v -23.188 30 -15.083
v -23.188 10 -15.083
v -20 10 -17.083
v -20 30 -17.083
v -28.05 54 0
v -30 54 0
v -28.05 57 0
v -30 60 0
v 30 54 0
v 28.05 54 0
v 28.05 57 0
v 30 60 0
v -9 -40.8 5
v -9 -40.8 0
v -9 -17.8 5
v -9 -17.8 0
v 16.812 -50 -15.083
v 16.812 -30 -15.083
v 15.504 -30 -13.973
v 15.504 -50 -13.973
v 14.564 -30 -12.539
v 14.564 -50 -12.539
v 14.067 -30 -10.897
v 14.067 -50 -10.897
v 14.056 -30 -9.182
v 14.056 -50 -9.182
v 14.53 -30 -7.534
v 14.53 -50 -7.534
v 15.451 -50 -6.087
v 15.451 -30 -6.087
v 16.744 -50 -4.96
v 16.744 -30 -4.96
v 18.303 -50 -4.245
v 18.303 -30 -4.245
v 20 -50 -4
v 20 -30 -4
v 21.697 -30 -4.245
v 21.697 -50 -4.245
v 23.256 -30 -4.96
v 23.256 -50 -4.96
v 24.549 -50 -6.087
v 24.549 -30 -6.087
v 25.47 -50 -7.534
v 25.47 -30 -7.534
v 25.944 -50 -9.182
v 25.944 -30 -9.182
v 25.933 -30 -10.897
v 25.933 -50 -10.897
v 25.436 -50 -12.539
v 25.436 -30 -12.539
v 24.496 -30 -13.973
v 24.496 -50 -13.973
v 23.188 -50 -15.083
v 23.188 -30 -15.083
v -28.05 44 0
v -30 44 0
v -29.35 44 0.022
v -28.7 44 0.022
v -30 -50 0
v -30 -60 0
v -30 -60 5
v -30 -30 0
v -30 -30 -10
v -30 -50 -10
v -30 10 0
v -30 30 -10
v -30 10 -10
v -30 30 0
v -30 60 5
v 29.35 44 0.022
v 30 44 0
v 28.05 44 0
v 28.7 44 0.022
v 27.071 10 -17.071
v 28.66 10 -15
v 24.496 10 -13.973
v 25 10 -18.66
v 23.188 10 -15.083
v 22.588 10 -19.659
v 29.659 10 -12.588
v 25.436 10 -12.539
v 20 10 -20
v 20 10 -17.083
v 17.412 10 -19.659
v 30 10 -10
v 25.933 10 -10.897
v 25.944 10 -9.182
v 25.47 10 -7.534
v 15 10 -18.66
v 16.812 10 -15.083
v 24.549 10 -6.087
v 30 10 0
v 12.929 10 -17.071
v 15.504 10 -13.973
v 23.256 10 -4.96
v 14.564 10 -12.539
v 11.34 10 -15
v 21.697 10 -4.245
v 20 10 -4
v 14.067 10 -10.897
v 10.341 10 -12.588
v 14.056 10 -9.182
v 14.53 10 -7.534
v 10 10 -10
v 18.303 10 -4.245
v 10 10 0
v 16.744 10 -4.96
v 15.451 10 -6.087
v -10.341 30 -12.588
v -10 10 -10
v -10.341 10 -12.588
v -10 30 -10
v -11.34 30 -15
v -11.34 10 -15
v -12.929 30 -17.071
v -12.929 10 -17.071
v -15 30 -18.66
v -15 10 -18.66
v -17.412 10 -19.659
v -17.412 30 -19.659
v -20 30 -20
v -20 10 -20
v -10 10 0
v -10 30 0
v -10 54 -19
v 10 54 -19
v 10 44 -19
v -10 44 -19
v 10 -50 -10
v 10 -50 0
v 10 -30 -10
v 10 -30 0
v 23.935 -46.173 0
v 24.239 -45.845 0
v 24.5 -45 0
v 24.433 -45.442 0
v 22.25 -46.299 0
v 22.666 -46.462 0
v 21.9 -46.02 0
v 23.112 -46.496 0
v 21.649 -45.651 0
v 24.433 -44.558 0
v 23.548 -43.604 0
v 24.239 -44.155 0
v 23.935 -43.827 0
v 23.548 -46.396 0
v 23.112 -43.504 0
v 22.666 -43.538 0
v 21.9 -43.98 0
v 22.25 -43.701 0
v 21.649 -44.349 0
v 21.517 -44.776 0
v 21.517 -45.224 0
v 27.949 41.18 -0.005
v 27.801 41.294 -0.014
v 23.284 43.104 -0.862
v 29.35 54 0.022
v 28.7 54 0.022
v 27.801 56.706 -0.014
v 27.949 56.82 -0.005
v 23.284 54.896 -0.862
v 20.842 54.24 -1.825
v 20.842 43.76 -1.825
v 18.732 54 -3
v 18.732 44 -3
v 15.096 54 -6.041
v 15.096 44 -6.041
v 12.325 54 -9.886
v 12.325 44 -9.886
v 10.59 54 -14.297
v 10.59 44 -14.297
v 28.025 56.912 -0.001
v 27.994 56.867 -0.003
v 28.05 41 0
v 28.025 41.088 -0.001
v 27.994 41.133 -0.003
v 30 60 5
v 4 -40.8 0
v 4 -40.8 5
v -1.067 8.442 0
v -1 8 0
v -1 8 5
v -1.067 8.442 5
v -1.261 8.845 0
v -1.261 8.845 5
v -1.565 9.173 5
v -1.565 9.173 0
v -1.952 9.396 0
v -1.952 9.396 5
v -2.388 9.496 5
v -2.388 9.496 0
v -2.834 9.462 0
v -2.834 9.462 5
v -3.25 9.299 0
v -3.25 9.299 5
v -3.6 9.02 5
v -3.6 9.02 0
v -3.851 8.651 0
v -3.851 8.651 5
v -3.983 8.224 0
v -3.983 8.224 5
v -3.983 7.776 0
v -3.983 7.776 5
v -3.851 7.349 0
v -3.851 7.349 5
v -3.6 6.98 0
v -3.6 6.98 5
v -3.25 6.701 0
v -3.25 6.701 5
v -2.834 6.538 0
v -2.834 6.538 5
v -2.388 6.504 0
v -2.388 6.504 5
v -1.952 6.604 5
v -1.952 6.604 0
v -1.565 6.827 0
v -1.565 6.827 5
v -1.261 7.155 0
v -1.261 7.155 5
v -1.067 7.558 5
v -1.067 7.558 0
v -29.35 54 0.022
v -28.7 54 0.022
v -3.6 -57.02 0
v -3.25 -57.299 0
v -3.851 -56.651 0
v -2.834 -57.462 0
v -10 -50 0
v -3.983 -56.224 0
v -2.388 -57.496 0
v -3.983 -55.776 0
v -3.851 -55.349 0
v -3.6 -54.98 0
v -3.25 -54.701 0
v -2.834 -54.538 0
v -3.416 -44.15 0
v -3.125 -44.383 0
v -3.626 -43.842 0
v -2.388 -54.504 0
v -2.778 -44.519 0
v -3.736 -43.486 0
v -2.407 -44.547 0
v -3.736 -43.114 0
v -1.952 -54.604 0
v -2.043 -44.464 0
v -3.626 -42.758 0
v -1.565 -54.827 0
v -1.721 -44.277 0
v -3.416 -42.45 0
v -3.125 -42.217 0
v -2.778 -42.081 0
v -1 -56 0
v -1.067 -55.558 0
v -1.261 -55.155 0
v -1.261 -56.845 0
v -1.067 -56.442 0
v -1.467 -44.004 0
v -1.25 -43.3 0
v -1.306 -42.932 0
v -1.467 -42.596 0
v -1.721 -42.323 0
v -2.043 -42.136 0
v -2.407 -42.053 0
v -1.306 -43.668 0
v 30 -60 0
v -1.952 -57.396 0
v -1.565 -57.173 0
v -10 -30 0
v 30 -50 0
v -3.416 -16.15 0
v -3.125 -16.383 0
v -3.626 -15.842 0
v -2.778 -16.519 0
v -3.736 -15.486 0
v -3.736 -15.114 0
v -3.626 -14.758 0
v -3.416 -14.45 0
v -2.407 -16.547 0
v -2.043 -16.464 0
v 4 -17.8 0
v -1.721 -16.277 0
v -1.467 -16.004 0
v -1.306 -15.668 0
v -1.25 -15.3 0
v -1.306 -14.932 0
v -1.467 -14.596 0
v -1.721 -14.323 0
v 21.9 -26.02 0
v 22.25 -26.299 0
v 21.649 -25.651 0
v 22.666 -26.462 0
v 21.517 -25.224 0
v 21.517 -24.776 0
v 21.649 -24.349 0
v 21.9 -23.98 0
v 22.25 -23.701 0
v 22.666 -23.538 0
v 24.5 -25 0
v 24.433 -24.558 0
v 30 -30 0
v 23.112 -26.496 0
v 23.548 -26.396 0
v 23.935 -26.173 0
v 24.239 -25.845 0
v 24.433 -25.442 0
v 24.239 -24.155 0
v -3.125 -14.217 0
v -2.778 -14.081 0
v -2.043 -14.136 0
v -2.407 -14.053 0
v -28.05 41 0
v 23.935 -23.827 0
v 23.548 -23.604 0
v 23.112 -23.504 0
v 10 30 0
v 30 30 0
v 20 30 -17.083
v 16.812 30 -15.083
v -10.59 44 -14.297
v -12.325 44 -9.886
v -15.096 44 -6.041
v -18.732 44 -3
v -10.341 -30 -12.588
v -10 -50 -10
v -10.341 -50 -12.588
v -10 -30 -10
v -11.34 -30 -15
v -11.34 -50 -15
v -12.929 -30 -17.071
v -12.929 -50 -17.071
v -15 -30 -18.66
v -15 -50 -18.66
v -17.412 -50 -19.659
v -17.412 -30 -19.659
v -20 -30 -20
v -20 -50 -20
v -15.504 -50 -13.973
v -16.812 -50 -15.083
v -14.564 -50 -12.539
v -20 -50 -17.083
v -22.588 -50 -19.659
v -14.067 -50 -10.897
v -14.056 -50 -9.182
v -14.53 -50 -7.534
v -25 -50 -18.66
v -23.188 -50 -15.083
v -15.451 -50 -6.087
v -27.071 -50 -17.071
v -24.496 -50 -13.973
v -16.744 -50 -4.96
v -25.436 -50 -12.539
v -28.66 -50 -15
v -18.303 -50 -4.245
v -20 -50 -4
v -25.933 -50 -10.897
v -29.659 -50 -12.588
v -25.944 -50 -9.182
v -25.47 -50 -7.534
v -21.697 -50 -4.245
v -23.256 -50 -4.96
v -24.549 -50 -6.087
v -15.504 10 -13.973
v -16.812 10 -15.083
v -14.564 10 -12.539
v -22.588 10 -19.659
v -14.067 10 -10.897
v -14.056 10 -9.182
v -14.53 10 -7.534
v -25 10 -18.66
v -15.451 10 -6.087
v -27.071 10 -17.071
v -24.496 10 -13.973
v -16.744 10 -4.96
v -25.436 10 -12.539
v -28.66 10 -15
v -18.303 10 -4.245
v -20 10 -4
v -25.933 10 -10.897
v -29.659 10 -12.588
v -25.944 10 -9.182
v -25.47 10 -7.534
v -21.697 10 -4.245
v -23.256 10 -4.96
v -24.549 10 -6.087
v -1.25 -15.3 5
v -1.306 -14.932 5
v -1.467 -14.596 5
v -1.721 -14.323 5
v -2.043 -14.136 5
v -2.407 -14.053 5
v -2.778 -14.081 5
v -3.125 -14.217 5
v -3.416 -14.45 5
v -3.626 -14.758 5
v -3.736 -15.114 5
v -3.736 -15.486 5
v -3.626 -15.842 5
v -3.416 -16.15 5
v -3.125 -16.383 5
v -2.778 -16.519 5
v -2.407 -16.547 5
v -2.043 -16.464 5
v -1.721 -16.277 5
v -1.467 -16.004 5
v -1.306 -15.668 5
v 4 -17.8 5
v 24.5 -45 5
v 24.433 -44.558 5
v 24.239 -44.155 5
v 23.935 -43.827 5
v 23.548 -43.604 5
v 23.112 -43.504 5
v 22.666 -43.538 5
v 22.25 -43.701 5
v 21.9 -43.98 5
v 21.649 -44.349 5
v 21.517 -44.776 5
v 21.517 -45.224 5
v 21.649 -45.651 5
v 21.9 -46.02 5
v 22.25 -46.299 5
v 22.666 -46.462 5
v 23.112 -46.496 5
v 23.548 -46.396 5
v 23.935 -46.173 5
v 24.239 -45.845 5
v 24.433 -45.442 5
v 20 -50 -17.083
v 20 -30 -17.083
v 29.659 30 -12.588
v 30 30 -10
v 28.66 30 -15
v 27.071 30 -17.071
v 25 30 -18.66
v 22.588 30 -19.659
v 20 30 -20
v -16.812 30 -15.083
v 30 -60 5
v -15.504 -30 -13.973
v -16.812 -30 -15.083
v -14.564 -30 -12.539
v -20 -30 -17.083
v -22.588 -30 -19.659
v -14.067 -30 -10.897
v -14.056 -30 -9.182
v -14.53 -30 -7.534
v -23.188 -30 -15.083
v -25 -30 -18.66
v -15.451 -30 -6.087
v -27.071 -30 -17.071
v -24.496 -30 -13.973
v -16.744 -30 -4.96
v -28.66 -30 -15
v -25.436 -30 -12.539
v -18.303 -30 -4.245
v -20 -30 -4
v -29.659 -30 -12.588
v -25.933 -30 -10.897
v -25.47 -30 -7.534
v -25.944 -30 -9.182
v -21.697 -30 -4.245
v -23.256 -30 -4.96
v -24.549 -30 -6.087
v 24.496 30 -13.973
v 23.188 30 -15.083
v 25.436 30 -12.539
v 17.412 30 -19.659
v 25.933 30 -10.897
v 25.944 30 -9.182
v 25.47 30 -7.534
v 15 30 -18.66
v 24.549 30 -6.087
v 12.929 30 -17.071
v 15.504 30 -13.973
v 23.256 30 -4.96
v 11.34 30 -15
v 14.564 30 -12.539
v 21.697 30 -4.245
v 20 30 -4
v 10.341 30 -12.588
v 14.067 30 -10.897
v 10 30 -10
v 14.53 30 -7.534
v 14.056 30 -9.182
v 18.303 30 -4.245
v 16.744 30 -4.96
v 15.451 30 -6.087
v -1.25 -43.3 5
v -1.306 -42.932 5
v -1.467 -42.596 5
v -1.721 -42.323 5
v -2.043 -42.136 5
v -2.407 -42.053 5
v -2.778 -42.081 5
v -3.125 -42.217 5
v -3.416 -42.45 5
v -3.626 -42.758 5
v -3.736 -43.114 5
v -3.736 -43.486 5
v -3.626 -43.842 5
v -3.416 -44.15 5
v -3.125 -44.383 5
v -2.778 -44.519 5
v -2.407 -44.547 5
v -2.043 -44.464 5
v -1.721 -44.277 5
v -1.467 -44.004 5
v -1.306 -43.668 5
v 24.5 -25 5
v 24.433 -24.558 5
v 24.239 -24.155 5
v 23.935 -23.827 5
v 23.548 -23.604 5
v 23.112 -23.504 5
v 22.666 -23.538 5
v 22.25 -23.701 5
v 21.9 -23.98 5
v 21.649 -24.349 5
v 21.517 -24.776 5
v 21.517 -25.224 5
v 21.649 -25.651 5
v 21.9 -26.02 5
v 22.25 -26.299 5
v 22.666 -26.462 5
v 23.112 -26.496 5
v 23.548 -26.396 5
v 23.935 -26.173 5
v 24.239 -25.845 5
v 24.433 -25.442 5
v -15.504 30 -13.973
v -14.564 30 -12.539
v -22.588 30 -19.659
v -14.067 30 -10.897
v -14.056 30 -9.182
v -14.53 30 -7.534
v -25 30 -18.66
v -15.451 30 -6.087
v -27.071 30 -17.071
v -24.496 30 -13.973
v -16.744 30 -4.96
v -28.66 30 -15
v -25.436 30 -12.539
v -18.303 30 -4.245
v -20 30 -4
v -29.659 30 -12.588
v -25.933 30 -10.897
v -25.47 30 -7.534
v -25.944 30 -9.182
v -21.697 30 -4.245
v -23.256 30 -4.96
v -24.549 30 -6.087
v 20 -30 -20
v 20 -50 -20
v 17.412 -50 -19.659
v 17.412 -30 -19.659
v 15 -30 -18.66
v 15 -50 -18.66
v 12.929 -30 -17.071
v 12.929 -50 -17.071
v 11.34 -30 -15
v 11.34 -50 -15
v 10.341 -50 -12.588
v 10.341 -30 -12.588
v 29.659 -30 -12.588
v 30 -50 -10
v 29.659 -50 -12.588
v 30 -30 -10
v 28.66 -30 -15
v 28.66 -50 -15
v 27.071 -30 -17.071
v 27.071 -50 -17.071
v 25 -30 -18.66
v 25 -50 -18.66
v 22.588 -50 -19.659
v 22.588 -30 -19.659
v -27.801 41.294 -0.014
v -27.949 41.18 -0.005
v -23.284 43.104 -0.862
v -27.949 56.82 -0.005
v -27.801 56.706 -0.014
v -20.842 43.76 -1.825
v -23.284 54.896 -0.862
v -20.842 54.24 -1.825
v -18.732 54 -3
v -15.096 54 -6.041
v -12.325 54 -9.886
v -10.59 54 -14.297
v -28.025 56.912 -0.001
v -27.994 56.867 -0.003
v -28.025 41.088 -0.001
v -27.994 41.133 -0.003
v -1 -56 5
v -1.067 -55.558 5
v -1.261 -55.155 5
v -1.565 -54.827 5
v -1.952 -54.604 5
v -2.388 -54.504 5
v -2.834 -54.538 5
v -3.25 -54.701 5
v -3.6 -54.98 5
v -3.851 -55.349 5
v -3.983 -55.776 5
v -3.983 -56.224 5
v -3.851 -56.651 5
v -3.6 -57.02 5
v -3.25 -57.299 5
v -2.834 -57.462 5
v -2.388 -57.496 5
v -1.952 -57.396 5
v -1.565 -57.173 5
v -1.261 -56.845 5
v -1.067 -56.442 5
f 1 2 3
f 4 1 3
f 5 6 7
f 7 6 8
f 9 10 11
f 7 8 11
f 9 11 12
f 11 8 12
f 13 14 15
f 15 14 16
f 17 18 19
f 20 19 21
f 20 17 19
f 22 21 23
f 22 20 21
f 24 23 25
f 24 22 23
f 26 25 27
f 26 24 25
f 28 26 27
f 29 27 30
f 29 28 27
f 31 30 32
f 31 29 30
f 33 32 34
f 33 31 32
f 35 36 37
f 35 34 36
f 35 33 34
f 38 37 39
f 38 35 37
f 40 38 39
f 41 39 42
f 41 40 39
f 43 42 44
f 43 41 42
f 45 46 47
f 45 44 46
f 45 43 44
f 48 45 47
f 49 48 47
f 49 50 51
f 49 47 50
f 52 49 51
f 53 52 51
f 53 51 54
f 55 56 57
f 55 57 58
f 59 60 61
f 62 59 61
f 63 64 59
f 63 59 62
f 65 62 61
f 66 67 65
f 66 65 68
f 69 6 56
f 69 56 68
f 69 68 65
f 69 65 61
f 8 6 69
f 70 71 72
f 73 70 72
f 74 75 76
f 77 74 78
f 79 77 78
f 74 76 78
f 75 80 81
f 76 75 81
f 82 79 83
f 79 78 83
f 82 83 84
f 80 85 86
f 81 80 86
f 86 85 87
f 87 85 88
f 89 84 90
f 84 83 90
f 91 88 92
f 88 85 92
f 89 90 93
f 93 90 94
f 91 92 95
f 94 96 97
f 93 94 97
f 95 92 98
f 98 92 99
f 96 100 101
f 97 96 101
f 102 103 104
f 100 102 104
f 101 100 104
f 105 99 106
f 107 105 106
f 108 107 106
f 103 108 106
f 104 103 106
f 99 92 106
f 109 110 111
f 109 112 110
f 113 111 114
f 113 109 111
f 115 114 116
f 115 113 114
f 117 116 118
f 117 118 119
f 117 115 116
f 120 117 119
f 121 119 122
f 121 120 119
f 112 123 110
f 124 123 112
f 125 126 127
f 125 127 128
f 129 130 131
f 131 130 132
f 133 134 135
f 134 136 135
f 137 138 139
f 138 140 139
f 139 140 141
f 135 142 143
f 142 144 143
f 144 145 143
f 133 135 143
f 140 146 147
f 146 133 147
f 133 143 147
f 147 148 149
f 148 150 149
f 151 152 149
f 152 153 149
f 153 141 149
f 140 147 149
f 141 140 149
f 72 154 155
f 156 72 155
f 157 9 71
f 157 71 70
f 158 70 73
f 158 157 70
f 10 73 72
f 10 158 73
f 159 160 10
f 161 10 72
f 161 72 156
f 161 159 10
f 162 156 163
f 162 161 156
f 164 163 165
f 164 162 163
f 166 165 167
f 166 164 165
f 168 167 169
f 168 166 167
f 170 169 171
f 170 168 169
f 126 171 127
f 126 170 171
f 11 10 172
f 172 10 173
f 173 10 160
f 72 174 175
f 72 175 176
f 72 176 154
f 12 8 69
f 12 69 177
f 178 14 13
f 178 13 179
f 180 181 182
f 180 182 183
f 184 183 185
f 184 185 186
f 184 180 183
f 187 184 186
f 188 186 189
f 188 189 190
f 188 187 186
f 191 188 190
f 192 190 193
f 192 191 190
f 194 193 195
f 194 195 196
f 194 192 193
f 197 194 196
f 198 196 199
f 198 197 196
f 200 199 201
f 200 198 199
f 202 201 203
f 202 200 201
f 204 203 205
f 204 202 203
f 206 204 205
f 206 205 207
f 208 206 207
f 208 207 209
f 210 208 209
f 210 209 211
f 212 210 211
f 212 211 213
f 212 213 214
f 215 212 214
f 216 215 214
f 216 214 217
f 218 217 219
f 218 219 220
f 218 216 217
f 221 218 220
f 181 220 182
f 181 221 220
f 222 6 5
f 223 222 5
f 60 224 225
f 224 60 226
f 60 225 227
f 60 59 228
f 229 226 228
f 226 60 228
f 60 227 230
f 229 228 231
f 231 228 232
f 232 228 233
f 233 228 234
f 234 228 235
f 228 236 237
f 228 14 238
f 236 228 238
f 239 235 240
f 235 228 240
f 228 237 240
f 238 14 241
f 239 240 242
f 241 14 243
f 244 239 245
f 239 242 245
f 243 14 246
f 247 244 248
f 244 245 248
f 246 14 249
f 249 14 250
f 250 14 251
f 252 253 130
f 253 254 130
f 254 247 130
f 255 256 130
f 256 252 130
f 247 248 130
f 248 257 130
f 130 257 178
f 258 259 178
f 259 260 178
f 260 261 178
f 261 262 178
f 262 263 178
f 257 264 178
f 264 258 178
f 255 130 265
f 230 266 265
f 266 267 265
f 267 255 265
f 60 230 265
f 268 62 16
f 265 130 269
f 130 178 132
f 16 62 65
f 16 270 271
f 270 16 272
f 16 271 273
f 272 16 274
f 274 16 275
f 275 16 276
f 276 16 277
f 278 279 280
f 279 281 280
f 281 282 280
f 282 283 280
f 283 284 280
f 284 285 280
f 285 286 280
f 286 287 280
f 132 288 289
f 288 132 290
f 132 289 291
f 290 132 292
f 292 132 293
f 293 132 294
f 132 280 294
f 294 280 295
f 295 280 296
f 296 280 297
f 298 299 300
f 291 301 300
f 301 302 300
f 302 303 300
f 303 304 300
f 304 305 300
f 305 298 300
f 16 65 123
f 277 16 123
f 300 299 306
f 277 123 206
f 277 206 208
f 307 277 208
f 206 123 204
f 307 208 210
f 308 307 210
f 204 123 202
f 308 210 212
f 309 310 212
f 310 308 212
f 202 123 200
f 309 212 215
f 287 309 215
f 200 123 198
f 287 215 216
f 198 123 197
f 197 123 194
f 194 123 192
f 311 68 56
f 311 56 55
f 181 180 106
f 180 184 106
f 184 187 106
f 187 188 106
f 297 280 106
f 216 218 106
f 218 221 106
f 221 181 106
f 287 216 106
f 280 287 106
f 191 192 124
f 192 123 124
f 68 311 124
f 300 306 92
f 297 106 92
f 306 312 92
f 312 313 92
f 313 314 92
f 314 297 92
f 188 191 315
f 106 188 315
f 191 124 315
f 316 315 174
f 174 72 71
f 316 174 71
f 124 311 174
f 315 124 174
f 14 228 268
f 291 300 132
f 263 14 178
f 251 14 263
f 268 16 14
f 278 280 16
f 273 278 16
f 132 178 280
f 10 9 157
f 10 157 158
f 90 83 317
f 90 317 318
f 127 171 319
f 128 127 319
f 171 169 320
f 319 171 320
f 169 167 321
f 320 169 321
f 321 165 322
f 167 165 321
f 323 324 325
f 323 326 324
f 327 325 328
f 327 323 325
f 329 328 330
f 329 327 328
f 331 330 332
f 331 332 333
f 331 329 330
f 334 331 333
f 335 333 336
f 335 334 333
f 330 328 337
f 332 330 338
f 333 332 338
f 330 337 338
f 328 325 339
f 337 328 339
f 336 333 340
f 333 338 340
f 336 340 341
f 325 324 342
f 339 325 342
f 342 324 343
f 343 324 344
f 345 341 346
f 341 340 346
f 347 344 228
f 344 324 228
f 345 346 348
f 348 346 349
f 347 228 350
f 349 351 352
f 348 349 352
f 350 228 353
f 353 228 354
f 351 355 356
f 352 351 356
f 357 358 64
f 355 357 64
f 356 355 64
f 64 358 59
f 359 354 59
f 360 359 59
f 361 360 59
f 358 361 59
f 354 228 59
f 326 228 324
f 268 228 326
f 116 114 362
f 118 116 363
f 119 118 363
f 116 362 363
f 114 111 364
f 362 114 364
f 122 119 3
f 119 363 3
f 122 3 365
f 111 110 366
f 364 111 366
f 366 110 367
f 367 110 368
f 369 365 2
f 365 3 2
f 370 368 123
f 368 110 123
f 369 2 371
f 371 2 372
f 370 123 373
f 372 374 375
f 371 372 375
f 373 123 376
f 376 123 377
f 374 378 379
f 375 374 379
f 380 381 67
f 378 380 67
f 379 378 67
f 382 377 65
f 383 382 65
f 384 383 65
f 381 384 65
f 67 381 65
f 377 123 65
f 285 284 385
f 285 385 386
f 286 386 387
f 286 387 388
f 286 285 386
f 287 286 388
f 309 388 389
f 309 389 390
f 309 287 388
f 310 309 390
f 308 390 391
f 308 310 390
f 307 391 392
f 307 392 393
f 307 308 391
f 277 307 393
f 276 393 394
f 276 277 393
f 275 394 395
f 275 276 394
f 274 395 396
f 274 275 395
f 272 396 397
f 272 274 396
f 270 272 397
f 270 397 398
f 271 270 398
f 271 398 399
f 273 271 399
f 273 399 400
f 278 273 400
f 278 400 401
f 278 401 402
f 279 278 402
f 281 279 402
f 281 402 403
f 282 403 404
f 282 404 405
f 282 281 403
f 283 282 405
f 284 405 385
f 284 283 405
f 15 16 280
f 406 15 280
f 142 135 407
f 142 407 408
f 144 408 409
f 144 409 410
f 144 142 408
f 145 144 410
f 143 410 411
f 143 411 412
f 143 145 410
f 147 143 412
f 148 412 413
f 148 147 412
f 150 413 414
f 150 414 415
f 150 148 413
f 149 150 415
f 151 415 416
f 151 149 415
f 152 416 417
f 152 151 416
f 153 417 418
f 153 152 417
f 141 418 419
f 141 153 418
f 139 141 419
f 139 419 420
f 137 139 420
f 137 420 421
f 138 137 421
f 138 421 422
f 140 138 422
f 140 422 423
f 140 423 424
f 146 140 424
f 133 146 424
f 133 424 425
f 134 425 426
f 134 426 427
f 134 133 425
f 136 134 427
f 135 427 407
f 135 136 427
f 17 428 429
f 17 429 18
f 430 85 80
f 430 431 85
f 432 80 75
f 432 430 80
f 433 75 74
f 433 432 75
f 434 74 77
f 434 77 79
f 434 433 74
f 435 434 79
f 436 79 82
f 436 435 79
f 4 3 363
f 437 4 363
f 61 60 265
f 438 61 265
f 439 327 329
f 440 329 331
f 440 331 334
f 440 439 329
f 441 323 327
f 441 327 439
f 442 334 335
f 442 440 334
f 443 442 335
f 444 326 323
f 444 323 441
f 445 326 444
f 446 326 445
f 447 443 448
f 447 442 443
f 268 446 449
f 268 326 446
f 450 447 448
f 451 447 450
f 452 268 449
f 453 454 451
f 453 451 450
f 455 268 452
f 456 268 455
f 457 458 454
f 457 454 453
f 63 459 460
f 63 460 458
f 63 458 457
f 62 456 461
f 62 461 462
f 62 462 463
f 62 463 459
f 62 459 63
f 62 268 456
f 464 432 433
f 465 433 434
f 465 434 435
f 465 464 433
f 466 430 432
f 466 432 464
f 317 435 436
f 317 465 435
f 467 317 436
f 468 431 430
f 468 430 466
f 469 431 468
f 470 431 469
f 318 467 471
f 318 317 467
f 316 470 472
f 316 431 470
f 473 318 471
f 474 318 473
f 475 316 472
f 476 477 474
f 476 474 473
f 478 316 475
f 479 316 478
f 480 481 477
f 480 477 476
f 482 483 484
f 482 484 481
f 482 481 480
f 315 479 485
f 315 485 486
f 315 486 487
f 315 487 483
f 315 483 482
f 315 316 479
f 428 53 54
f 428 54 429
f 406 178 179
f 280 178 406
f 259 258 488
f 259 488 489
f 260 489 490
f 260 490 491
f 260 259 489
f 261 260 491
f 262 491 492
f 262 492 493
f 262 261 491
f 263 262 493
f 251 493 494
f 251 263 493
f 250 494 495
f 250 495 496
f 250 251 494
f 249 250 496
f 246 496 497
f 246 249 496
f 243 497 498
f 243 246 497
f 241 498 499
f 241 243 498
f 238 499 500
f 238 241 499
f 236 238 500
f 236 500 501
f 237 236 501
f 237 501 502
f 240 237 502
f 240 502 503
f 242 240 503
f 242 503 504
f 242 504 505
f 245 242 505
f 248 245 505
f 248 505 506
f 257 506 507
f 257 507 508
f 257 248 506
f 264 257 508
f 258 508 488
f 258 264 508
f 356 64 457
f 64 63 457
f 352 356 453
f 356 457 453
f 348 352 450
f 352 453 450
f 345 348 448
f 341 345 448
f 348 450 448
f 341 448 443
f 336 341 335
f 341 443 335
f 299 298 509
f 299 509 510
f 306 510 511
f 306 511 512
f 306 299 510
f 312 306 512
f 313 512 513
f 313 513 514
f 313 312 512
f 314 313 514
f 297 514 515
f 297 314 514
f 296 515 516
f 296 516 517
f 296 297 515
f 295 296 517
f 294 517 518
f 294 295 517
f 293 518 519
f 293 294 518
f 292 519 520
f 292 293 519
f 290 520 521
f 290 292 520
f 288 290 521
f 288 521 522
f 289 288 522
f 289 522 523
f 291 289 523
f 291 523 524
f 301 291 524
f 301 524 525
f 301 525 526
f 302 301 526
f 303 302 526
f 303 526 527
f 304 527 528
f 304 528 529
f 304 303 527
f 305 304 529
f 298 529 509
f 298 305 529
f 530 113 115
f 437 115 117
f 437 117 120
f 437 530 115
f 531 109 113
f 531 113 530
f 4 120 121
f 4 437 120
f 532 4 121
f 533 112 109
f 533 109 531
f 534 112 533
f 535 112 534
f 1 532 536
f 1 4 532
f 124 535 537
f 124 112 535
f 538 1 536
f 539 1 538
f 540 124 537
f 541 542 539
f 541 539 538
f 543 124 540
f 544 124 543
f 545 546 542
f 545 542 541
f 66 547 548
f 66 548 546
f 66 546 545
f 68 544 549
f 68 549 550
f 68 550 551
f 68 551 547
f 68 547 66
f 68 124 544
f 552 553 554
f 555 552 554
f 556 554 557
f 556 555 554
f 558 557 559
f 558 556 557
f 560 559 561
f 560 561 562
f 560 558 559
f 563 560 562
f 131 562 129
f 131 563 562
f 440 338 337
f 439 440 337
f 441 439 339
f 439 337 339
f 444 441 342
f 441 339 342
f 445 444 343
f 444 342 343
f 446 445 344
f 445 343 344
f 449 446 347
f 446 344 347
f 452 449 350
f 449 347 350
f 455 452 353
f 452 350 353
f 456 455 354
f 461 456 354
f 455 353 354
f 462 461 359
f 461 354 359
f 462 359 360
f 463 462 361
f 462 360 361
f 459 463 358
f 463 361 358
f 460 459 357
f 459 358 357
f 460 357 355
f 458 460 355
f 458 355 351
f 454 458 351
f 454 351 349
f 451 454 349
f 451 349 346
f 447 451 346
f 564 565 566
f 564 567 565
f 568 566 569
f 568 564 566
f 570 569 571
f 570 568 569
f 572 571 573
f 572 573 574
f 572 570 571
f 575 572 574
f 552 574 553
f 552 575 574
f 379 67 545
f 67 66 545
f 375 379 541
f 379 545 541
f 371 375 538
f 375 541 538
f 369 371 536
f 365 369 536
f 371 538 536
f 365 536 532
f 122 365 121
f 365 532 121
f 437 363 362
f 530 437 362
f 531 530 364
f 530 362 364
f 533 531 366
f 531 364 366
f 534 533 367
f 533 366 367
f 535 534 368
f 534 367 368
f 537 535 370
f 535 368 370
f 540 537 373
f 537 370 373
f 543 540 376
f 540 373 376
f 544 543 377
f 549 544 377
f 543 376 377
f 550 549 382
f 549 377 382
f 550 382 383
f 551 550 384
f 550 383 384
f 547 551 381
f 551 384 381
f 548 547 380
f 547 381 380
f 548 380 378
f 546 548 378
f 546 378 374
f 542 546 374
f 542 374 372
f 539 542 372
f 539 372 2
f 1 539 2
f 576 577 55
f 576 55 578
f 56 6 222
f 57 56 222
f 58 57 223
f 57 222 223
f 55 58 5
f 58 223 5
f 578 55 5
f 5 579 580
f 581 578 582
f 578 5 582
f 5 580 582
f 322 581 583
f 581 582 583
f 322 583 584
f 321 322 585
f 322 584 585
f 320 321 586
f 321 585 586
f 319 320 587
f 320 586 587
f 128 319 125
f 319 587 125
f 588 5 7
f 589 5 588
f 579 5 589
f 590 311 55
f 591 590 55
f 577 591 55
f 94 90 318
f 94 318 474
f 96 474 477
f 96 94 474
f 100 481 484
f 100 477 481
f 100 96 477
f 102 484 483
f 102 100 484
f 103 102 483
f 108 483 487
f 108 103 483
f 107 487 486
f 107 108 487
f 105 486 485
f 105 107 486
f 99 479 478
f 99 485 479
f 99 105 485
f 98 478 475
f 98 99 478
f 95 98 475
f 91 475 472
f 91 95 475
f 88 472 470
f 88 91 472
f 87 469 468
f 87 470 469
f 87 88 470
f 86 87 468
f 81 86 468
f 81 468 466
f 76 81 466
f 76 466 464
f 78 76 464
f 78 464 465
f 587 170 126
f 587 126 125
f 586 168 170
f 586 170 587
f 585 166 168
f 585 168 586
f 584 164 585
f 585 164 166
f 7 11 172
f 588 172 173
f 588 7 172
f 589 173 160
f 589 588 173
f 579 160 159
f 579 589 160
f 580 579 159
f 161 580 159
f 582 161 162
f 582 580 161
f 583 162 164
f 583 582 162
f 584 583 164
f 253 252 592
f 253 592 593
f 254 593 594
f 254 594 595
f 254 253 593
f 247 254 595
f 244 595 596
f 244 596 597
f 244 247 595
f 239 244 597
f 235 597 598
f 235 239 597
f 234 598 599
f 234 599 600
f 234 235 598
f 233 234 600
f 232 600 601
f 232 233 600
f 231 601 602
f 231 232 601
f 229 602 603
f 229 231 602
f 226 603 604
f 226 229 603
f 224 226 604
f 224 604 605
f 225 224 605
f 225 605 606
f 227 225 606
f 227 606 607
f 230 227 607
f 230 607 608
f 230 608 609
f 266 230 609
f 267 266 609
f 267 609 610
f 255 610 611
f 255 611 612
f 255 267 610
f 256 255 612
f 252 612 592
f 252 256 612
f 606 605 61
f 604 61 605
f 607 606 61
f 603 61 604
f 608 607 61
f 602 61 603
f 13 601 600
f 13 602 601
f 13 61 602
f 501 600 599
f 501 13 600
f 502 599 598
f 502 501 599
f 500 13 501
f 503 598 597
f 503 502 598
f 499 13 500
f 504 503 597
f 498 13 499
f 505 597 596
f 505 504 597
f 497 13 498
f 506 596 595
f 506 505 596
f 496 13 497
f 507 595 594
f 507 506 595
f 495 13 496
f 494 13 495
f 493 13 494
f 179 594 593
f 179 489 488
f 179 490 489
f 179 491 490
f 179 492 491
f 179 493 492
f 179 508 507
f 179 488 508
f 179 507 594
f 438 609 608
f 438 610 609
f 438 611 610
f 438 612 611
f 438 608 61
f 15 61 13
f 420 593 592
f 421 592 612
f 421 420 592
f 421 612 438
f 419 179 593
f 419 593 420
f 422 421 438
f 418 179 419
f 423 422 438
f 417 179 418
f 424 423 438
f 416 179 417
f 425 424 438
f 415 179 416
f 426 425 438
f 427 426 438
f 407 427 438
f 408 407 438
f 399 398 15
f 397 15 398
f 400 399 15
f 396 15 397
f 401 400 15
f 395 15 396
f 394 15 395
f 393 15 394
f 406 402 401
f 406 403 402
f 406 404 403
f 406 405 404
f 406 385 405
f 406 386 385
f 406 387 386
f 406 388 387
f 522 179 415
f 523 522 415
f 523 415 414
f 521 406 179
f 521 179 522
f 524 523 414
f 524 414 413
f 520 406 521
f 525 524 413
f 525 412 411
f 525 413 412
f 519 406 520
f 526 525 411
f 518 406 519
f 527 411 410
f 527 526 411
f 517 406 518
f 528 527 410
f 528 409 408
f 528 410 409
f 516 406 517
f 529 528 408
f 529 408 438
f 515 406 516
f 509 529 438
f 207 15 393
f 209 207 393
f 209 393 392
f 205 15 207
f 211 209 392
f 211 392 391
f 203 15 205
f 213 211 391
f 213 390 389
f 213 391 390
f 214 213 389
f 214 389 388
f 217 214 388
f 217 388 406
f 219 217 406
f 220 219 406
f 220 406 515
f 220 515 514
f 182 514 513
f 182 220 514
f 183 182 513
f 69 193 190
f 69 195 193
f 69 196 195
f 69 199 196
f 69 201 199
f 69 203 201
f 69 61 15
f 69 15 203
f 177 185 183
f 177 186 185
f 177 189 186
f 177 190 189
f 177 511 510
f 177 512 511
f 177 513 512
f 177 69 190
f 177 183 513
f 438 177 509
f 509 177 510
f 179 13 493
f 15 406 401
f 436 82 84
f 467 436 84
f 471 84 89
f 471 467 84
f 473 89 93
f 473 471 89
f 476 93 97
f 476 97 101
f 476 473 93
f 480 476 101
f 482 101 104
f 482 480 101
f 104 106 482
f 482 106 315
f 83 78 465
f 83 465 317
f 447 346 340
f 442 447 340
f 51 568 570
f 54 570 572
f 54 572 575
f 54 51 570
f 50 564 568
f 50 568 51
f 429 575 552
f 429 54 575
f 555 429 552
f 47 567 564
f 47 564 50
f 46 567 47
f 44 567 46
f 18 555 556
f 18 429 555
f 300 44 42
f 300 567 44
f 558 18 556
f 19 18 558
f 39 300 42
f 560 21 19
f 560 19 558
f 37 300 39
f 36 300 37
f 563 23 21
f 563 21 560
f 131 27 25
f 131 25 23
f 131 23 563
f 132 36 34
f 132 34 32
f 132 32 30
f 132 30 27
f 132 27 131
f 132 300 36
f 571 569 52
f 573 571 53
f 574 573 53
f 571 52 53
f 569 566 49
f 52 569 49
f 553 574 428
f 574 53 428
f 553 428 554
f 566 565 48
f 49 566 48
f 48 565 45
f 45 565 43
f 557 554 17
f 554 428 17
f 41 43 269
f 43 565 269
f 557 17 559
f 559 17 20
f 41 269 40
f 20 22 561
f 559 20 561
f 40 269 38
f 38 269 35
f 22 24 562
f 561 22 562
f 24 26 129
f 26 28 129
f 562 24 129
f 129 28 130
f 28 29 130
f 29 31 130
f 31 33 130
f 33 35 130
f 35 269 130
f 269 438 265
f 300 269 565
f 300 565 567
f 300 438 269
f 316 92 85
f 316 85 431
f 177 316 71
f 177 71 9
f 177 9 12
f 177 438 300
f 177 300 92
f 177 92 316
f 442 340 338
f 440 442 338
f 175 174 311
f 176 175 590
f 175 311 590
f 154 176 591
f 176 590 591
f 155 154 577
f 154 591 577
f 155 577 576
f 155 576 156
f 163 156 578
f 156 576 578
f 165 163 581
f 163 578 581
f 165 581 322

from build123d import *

# Parameters (mm, degrees)
SKETCH1_W           = 60
SKETCH1_H           = 120
SKETCH1_R           = 1.5
SKETCH1_R_2         = 1.25
SKETCH1_W_2         = 13
SKETCH1_H_2         = 23
BOSS_EXTRUDE1_DEPTH = 5
SKETCH2_W           = 20
SKETCH2_H           = 20
BOSS_EXTRUDE2_DEPTH = 20
CUT_EXTRUDE1_DEPTH  = 116.758369028
FILLET1_R           = 10
SKETCH4_W           = 60
SKETCH4_H           = 10
BOSS_EXTRUDE3_DEPTH = 19
CUT_EXTRUDE2_DEPTH  = 10
FILLET2_R           = 3


with BuildPart() as part:
    # Sketch1 → Boss-Extrude1 (new body)
    with BuildSketch(Plane.XY):
        Rectangle(SKETCH1_W, SKETCH1_H)
        with Locations((23, -25)):
            Circle(SKETCH1_R, mode=Mode.SUBTRACT)
        with Locations((23, -45)):
            Circle(SKETCH1_R, mode=Mode.SUBTRACT)
        with Locations((-2.5, -56)):
            Circle(SKETCH1_R, mode=Mode.SUBTRACT)
        with Locations((-2.5, 8)):
            Circle(SKETCH1_R, mode=Mode.SUBTRACT)
        with Locations((-2.5, -15.3)):
            Circle(SKETCH1_R_2, mode=Mode.SUBTRACT)
        with Locations((-2.5, -43.3)):
            Circle(SKETCH1_R_2, mode=Mode.SUBTRACT)
        with Locations((-2.5, -29.3)):
            Rectangle(SKETCH1_W_2, SKETCH1_H_2, mode=Mode.SUBTRACT)
    extrude(amount=BOSS_EXTRUDE1_DEPTH)

    # Sketch2 → Boss-Extrude2 (add)
    with BuildSketch(Plane(origin=(0, 0, 0), x_dir=(-1, 0, 0), z_dir=(0, 0, -1))):
        with Locations((-20, -40)):
            Rectangle(SKETCH2_W, SKETCH2_H)
        with Locations((20, -40)):
            Rectangle(SKETCH2_W, SKETCH2_H)
        with Locations((20, 20)):
            Rectangle(SKETCH2_W, SKETCH2_H)
        with Locations((-20, 20)):
            Rectangle(SKETCH2_W, SKETCH2_H)
    extrude(amount=BOSS_EXTRUDE2_DEPTH)

    # Sketch3 → Cut-Extrude1 (cut, through all)
    with BuildSketch(Plane.XZ.offset(50)):
        with BuildLine():
            Line((-23.188342055, -15.08276253), (-20, -17.08276253))
            Line((-20, -17.08276253), (-16.811657945, -15.08276253))
            ThreePointArc((-16.811657945, -15.08276253), (-20, -4), (-23.188342055, -15.08276253))
        make_face()
        with BuildLine():
            Line((20, -17.08276253), (16.811657945, -15.08276253))
            ThreePointArc((16.811657945, -15.08276253), (20, -4), (23.188342055, -15.08276253))
            Line((23.188342055, -15.08276253), (20, -17.08276253))
        make_face()
    extrude(amount=-CUT_EXTRUDE1_DEPTH, mode=Mode.SUBTRACT)

    # Fillet1
    fillet1_edges = [part.edges().sort_by_distance(p)[0] for p in [
        (-10, -40, -20),
        (-30, -40, -20),
        (-30, 20, -20),
        (-10, 20, -20),
        (30, 20, -20),
        (10, 20, -20),
        (10, -40, -20),
        (30, -40, -20),
    ]]
    fillet(fillet1_edges, radius=FILLET1_R - 0.0001)  # a hair under: the kernel refuses the full size

    # Sketch4 → Boss-Extrude3 (add)
    with BuildSketch(Plane(origin=(0, 0, 0), x_dir=(-1, 0, 0), z_dir=(0, 0, -1))):
        with Locations((0, 49)):
            Rectangle(SKETCH4_W, SKETCH4_H)
    extrude(amount=BOSS_EXTRUDE3_DEPTH)

    # Sketch5 → Cut-Extrude2 (cut)
    with BuildSketch(Plane(origin=(0, 54, 0), x_dir=(1, 0, 0), z_dir=(0, 1, 0))):
        with BuildLine():
            Line((-10, 19), (-30, 19))
            Line((-30, 19), (-30, 0))
            ThreePointArc((-30, 0), (-15.921541487, 5.206885776), (-10, 19))
        make_face()
        with BuildLine():
            Line((10, 19), (30, 19))
            Line((30, 19), (30, 0))
            ThreePointArc((30, 0), (15.921541487, 5.206885776), (10, 19))
        make_face()
    extrude(amount=-CUT_EXTRUDE2_DEPTH, mode=Mode.SUBTRACT)

    # Fillet2
    fillet2_edges = [part.edges().sort_by_distance(p)[0] for p in [
        (0, 44, 0),
        (0, 54, 0),
    ]]
    fillet(fillet2_edges, radius=FILLET2_R)


solid = part.part
